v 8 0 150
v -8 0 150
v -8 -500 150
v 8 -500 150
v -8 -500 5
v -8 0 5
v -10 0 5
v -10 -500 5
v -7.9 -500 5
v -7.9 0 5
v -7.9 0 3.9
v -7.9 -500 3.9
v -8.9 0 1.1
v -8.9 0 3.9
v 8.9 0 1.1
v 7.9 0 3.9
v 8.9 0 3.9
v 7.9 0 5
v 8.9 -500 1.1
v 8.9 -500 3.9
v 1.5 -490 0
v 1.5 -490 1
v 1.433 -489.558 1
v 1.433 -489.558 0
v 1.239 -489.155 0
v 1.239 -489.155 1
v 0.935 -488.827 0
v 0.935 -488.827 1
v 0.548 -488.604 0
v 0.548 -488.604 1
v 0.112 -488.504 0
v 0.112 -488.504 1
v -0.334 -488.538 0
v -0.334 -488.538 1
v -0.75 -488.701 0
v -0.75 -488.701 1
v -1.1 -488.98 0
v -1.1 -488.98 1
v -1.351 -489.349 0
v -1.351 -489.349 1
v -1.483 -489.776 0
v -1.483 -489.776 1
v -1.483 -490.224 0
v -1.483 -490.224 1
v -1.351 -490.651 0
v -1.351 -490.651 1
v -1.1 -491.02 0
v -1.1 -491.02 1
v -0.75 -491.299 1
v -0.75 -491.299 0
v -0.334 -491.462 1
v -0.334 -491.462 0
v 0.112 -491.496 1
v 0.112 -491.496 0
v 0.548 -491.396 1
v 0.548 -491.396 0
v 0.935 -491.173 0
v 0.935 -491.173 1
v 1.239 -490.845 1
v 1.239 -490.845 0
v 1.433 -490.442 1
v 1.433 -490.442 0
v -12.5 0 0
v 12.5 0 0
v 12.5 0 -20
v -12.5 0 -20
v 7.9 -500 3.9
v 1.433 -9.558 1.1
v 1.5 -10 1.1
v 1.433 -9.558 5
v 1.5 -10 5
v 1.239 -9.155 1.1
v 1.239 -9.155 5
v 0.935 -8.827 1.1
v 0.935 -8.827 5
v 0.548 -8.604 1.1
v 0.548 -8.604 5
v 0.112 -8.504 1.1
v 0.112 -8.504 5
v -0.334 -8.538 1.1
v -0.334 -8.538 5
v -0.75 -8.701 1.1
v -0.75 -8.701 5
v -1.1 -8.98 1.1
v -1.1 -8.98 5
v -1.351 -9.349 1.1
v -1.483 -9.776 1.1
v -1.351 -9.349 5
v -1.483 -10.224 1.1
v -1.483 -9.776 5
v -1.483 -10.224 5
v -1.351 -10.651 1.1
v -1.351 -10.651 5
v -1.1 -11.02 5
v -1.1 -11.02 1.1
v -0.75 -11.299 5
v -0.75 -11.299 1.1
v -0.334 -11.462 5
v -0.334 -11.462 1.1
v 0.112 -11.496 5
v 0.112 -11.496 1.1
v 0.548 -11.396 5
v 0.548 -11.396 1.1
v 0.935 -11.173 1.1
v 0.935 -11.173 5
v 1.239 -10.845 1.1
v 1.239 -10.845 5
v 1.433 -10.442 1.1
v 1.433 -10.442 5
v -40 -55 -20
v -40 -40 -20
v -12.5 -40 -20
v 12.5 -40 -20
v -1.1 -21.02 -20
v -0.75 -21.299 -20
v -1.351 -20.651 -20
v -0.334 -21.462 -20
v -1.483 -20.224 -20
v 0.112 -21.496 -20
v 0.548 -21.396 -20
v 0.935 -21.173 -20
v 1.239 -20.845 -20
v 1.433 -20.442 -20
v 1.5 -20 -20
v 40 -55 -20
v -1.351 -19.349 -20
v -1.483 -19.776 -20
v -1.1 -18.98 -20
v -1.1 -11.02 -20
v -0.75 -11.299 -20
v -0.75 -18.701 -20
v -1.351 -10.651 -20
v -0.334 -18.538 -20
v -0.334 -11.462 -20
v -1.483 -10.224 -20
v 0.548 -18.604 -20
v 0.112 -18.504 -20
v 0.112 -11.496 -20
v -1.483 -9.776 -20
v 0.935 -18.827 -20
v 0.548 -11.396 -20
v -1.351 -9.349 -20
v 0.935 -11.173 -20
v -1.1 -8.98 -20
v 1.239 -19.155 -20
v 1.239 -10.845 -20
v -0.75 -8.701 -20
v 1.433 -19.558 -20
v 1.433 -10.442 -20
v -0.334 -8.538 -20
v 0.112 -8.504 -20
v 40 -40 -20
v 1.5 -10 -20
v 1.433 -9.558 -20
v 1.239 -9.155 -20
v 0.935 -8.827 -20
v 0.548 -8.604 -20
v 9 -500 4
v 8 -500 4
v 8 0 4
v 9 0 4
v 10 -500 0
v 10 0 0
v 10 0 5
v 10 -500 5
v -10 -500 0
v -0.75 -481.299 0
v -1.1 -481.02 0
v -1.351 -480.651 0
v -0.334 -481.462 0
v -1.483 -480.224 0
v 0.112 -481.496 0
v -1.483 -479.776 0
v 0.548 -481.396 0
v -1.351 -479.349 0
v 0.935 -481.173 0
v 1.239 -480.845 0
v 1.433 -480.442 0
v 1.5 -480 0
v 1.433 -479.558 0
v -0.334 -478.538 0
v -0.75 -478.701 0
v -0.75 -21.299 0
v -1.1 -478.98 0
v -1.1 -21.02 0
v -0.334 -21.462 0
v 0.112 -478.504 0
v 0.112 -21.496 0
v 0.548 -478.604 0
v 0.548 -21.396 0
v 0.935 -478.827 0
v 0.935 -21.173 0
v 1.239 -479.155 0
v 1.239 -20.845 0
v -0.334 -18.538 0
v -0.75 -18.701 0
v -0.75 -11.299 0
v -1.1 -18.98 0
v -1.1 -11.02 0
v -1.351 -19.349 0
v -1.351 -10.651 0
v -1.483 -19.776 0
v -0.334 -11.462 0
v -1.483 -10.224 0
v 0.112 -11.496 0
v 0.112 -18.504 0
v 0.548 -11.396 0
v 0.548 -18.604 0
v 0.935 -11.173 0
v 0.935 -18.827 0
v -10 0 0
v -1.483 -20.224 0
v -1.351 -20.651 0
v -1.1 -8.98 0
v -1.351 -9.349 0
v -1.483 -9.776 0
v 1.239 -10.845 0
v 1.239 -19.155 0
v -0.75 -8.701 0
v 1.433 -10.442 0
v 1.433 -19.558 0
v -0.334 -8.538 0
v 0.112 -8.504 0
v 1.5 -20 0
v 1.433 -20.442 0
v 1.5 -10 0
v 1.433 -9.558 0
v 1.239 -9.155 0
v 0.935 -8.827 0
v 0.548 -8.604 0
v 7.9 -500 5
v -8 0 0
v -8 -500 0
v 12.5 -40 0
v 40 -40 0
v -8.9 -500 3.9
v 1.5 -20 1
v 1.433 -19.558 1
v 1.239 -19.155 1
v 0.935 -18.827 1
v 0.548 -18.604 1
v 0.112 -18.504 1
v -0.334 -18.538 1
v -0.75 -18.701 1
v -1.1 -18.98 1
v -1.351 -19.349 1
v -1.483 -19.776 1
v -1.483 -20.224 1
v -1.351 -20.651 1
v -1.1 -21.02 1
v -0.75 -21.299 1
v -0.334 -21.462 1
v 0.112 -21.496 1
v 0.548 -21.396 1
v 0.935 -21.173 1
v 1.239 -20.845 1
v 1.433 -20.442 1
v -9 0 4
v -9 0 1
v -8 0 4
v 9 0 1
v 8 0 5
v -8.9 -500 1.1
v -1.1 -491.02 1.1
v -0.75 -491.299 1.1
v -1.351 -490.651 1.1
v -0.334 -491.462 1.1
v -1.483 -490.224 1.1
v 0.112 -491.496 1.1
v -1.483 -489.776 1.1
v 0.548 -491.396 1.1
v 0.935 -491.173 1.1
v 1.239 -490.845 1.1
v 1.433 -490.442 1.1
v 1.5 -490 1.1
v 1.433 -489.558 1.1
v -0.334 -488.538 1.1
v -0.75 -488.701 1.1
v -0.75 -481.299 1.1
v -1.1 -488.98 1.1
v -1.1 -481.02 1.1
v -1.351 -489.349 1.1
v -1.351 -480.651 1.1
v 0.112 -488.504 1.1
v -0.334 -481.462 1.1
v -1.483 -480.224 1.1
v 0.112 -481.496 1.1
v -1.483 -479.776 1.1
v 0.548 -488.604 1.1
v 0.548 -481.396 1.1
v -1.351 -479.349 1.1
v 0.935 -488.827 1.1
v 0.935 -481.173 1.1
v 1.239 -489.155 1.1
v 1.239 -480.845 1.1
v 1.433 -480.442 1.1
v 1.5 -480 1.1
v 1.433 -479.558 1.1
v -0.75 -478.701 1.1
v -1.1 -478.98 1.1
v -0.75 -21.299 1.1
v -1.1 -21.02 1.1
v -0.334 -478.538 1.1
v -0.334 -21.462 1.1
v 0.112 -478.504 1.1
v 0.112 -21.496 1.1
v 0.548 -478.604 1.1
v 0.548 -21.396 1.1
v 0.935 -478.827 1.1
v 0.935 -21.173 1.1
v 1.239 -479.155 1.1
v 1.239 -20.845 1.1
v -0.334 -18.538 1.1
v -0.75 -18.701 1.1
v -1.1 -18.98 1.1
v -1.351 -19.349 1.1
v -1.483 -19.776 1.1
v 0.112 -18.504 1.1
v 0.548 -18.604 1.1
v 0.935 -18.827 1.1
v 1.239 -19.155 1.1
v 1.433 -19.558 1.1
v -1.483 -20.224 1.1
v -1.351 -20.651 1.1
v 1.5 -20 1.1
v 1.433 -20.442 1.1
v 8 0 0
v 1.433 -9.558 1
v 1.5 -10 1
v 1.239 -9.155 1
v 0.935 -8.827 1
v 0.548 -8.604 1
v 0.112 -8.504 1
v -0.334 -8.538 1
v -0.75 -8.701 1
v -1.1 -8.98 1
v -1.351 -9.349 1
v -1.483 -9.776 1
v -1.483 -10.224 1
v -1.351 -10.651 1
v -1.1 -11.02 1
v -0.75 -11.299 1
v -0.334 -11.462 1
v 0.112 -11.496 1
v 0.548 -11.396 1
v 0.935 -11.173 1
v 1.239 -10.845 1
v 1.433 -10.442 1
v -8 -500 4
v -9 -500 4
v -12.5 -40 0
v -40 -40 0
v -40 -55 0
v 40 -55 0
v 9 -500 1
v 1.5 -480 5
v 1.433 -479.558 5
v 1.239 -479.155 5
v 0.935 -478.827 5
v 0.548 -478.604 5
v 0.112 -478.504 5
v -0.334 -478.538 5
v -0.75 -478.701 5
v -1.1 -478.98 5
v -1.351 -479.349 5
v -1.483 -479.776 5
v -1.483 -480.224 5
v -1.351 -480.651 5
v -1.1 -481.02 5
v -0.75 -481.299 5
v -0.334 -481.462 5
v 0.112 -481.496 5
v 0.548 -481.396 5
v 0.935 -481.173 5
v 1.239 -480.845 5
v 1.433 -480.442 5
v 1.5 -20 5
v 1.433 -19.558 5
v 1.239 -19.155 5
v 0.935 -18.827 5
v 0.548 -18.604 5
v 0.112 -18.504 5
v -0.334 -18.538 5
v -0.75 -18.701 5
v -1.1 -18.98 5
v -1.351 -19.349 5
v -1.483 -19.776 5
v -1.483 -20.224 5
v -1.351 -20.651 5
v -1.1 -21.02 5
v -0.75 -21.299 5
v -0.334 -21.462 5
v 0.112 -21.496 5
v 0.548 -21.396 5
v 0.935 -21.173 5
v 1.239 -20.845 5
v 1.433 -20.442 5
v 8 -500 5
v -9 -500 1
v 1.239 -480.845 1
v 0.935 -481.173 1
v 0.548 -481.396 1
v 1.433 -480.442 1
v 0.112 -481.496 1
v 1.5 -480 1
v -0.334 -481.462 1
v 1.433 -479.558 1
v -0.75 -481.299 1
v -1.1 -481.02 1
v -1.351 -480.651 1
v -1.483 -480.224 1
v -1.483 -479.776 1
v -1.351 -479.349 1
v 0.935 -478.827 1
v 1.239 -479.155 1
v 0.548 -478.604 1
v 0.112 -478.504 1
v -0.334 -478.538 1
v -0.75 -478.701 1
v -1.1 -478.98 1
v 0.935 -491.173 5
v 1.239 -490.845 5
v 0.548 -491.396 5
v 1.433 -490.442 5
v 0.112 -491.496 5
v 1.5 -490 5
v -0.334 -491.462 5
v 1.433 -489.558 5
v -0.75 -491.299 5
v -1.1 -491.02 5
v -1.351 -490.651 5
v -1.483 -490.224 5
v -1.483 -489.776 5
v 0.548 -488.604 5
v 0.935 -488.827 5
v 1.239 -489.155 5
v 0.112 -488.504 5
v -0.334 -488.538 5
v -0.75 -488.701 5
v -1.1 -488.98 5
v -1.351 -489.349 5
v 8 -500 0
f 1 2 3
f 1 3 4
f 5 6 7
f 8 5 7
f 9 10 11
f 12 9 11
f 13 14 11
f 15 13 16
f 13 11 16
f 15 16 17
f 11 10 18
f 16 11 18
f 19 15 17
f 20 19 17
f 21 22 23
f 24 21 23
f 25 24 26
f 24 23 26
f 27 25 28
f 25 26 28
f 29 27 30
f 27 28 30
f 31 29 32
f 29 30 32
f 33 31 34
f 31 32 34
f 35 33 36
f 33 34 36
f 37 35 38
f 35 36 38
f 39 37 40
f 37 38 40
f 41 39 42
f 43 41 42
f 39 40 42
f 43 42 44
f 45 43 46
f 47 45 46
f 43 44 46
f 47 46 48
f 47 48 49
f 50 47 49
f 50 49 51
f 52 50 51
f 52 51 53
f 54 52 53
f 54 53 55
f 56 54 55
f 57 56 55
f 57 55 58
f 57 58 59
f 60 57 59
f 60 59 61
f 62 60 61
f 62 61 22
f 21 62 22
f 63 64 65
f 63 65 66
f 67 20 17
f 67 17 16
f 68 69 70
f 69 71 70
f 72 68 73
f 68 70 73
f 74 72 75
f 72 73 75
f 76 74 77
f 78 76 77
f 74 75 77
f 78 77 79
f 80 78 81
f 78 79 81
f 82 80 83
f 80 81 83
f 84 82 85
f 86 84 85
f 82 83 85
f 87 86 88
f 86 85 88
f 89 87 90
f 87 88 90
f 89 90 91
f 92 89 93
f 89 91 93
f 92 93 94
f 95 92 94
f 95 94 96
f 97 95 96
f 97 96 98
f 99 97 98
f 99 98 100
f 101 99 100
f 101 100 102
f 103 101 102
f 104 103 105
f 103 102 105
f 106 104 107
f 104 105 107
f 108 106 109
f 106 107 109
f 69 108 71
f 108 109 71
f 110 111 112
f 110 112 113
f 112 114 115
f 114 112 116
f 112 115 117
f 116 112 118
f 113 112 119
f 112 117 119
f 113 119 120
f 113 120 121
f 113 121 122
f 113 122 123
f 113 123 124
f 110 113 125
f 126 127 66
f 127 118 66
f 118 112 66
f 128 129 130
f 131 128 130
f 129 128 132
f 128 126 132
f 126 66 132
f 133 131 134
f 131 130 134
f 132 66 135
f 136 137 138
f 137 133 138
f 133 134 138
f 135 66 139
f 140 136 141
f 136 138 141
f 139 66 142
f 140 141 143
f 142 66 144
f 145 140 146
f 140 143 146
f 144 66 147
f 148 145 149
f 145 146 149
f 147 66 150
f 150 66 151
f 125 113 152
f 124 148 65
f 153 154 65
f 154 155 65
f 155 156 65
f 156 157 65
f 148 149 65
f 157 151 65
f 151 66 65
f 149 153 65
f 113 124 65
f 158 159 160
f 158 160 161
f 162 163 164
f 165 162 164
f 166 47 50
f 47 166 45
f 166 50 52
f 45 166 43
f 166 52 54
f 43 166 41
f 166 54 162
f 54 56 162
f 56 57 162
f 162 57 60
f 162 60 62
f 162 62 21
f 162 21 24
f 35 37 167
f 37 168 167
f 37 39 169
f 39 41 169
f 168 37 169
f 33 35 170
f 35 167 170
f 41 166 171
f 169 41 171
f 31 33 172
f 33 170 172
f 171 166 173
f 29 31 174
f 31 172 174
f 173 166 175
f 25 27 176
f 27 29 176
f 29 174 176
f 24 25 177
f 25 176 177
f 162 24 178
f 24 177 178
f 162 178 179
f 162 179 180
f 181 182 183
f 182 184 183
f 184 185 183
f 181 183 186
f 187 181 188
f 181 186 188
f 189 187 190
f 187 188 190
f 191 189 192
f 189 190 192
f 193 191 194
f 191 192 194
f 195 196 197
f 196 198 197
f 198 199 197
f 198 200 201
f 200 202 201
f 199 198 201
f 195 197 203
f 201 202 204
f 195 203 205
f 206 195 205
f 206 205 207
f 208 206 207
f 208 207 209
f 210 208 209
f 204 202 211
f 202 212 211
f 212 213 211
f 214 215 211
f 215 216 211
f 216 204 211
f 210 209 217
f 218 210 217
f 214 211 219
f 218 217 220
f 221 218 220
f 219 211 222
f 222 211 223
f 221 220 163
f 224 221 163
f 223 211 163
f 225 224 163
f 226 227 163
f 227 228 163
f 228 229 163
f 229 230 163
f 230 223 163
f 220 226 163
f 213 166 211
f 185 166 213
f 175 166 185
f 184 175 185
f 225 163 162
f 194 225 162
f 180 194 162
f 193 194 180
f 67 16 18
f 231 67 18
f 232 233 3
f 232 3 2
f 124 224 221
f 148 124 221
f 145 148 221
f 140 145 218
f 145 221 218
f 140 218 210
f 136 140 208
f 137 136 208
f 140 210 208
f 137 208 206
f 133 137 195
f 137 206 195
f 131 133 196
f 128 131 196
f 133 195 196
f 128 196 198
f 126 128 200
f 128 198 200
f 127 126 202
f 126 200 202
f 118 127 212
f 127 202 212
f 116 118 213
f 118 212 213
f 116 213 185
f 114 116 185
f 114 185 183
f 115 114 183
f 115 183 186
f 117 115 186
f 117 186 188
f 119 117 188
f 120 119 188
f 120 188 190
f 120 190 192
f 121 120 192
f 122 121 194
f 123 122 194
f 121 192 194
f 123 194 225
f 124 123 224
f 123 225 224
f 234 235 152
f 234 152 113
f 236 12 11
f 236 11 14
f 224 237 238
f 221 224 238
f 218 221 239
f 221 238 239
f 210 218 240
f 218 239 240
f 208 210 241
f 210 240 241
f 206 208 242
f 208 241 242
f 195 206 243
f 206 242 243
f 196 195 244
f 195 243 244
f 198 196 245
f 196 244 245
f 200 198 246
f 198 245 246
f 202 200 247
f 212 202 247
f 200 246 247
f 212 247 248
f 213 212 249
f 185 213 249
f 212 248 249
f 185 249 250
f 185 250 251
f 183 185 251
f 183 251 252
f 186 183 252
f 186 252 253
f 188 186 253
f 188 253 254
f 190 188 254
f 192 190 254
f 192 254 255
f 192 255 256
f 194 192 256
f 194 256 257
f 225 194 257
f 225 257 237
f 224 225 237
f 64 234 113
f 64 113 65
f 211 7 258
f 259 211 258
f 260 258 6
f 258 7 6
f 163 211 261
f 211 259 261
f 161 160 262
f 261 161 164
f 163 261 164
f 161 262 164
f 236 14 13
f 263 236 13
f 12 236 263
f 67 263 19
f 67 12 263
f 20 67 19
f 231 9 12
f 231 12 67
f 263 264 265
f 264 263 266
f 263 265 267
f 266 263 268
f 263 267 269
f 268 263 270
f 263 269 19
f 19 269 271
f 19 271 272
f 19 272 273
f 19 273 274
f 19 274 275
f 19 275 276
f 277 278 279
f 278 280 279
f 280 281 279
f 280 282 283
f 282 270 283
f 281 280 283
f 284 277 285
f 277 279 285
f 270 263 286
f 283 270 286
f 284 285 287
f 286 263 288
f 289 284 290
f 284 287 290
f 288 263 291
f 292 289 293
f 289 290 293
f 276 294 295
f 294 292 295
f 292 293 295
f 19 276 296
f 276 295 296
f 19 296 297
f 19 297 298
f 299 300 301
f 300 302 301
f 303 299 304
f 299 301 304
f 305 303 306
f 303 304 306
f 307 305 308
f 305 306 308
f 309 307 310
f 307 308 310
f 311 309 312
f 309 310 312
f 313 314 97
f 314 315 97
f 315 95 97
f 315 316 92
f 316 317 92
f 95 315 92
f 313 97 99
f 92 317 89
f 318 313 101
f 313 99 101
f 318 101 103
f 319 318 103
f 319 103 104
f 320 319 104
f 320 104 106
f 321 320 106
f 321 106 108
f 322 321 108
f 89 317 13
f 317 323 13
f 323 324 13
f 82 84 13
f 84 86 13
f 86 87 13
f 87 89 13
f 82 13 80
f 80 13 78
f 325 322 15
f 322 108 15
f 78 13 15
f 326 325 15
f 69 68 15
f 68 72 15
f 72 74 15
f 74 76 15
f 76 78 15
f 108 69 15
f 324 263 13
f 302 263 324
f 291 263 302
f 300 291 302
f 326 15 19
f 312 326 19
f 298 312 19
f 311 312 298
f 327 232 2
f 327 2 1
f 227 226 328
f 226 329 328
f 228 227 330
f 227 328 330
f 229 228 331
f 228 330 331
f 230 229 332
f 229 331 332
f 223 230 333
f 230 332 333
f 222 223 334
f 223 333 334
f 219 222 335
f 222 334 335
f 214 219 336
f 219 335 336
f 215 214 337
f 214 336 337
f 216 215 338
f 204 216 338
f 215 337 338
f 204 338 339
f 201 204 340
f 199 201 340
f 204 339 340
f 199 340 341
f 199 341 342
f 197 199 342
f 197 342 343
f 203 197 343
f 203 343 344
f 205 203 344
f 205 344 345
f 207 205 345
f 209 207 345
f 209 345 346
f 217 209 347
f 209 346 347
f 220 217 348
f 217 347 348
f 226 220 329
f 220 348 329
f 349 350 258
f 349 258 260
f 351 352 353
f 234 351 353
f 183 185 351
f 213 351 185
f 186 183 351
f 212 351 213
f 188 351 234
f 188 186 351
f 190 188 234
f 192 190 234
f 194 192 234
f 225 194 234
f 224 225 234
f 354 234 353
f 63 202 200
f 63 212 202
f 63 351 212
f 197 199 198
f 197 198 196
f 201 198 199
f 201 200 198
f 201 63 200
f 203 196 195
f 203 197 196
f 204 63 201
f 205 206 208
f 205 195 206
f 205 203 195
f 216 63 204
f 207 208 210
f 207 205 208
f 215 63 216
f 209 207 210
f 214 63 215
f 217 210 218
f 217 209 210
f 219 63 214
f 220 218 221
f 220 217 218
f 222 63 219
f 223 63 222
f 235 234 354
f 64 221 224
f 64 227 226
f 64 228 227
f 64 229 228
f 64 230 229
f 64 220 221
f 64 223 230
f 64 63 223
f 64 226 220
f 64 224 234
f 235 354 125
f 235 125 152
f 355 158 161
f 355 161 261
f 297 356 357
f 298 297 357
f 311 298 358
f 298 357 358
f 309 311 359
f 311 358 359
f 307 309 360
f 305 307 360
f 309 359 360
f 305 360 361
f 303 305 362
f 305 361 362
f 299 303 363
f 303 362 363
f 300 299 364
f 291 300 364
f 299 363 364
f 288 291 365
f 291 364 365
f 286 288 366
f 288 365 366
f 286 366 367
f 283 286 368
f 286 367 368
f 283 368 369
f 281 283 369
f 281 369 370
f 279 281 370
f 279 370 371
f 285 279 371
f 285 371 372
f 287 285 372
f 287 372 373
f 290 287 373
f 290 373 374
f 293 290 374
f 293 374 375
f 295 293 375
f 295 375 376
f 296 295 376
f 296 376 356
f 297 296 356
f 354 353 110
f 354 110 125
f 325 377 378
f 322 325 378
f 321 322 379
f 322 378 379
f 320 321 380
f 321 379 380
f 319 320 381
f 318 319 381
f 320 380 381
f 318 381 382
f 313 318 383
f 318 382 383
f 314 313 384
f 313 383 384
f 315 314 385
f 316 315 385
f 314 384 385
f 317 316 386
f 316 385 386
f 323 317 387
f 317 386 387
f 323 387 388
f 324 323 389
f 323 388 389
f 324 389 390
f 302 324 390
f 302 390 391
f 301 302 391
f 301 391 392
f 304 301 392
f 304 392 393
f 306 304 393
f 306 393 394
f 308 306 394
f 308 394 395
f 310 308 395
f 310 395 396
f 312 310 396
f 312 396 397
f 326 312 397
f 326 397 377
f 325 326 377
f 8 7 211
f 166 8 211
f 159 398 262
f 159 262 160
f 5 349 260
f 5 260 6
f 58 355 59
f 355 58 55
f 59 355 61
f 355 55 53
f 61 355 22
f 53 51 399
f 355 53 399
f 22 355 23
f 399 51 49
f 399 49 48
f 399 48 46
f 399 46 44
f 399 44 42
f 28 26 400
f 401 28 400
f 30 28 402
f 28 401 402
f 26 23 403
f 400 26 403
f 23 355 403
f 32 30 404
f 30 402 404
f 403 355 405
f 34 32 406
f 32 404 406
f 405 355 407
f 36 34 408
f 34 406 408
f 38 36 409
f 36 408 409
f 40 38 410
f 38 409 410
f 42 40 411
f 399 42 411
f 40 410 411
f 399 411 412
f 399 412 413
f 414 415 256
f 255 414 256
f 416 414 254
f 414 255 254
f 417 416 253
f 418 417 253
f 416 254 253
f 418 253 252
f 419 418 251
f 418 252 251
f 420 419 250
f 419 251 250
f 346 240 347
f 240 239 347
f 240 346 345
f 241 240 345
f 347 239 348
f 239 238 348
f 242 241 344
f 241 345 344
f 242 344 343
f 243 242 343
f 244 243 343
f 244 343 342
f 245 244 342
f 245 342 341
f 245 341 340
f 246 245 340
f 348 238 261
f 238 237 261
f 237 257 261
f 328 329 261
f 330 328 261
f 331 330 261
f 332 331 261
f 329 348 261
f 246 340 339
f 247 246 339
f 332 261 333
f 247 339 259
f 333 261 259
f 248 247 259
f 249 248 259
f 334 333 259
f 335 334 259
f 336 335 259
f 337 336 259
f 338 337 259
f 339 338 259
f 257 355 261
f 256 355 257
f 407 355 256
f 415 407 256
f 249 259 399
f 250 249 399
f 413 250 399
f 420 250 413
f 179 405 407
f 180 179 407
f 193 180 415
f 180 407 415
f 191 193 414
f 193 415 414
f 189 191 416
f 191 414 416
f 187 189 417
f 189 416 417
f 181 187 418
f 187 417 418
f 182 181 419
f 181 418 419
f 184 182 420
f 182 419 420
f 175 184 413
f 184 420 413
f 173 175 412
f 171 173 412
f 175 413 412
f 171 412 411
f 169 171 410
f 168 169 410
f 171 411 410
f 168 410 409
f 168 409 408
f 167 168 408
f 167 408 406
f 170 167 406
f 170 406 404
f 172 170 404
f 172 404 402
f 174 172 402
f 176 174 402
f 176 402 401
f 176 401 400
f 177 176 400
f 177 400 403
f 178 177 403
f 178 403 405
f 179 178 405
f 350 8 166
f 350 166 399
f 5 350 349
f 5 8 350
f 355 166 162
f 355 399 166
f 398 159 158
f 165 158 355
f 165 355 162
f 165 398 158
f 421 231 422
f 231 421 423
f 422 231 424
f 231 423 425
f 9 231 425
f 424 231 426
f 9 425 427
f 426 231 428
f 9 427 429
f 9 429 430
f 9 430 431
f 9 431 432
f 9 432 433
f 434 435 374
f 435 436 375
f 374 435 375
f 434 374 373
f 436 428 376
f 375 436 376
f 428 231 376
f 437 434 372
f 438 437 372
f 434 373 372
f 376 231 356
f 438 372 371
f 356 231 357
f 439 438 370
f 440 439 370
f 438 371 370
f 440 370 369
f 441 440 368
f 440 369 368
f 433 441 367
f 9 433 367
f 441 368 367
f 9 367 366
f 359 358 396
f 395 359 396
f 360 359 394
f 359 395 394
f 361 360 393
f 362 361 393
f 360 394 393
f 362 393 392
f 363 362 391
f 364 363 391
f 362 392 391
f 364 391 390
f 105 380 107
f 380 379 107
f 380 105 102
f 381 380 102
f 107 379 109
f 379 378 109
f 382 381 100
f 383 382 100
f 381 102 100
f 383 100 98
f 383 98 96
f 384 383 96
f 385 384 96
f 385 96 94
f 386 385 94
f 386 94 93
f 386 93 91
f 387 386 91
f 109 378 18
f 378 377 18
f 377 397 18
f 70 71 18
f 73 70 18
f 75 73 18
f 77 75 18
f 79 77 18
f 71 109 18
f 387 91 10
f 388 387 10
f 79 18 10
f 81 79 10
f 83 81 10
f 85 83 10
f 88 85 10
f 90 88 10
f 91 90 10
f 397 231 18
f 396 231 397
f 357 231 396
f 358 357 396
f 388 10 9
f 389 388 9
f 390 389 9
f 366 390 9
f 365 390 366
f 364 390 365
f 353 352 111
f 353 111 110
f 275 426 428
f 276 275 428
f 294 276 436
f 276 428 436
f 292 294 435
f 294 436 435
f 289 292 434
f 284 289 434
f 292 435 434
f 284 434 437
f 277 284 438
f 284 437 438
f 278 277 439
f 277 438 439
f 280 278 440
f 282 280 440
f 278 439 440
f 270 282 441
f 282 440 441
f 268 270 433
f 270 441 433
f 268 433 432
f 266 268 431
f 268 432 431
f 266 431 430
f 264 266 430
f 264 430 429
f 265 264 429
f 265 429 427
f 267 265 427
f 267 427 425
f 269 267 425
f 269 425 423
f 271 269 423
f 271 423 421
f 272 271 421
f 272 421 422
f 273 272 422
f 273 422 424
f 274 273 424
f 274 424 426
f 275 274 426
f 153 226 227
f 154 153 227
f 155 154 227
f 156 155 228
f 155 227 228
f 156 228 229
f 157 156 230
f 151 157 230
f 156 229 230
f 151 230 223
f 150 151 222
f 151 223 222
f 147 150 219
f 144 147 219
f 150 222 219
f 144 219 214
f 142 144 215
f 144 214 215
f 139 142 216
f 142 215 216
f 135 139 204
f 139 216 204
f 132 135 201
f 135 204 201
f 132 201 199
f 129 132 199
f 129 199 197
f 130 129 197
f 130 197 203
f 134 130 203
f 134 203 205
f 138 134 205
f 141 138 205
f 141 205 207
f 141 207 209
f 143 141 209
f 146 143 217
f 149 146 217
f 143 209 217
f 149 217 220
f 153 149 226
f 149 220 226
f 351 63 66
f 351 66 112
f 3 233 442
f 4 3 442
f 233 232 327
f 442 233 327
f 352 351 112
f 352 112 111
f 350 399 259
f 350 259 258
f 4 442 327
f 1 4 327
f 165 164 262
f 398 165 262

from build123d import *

# Parameters (mm, degrees)
F1_DEPTH  = 500
F3_DEPTH  = 500
F4_R      = 1.5
F5_DEPTH  = 7.5
F7_W      = 16
F7_H      = 500
F8_DEPTH  = 150
F9_R      = 1.5
F10_DEPTH = 20


with BuildPart() as f1:
    # F0 (on Front) → F1 (new body)
    with BuildSketch(Plane.XZ):
        Polygon((-8, 4), (-8, 5), (-10, 5), (-10, 0), (0, 0), (0, 1), (-9, 1), (-9, 4), align=None)
        Polygon((0, 1), (0, 0), (10, 0), (10, 5), (8, 5), (8, 4), (9, 4), (9, 1), align=None)
    extrude(amount=F1_DEPTH)


with BuildPart() as f3:
    # F2 (on Front) → F3 (new body)
    with BuildSketch(Plane.XZ):
        Polygon((0, 5), (-7.9, 5), (-7.9, 3.9), (-8.9, 3.9), (-8.9, 1.1), (0, 1.1), align=None)
        Polygon((7.9, 5), (0, 5), (0, 1.1), (8.9, 1.1), (8.9, 3.9), (7.9, 3.9), align=None)
    extrude(amount=F3_DEPTH)


with BuildPart() as f5:
    # F4 (on face) → F5 (new body, symmetric)
    with BuildSketch(Plane.XY.offset(5)):
        with Locations((0, -490)):
            Circle(F4_R)
        with Locations((0, -480)):
            Circle(F4_R)
        with Locations((0, -20)):
            Circle(F4_R)
        with Locations((0, -10)):
            Circle(F4_R)
    extrude(amount=F5_DEPTH, both=True)


with BuildPart() as f3_1:
    add(f3.part)

    # F6: cut F5
    add(f5.part, mode=Mode.SUBTRACT)


with BuildPart() as f1_1:
    add(f1.part)

    # F6: cut F5
    add(f5.part, mode=Mode.SUBTRACT)


with BuildPart() as f8:
    # F7 (on Top) → F8 (new body)
    with BuildSketch(Plane.XY):
        with Locations((0, -250)):
            Rectangle(F7_W, F7_H)
    extrude(amount=F8_DEPTH)


with BuildPart() as f10:
    # F9 (on Top) → F10 (new body)
    with BuildSketch(Plane.XY):
        Polygon((40, -55), (40, -40), (12.5, -40), (12.5, 0), (-12.5, 0), (-12.5, -40), (-40, -40), (-40, -55), align=None)
        with Locations((0, -20)):
            Circle(F9_R, mode=Mode.SUBTRACT)
        with Locations((0, -10)):
            Circle(F9_R, mode=Mode.SUBTRACT)
    extrude(amount=-F10_DEPTH)


solid = Compound([f3_1.part, f1_1.part, f8.part, f10.part])
